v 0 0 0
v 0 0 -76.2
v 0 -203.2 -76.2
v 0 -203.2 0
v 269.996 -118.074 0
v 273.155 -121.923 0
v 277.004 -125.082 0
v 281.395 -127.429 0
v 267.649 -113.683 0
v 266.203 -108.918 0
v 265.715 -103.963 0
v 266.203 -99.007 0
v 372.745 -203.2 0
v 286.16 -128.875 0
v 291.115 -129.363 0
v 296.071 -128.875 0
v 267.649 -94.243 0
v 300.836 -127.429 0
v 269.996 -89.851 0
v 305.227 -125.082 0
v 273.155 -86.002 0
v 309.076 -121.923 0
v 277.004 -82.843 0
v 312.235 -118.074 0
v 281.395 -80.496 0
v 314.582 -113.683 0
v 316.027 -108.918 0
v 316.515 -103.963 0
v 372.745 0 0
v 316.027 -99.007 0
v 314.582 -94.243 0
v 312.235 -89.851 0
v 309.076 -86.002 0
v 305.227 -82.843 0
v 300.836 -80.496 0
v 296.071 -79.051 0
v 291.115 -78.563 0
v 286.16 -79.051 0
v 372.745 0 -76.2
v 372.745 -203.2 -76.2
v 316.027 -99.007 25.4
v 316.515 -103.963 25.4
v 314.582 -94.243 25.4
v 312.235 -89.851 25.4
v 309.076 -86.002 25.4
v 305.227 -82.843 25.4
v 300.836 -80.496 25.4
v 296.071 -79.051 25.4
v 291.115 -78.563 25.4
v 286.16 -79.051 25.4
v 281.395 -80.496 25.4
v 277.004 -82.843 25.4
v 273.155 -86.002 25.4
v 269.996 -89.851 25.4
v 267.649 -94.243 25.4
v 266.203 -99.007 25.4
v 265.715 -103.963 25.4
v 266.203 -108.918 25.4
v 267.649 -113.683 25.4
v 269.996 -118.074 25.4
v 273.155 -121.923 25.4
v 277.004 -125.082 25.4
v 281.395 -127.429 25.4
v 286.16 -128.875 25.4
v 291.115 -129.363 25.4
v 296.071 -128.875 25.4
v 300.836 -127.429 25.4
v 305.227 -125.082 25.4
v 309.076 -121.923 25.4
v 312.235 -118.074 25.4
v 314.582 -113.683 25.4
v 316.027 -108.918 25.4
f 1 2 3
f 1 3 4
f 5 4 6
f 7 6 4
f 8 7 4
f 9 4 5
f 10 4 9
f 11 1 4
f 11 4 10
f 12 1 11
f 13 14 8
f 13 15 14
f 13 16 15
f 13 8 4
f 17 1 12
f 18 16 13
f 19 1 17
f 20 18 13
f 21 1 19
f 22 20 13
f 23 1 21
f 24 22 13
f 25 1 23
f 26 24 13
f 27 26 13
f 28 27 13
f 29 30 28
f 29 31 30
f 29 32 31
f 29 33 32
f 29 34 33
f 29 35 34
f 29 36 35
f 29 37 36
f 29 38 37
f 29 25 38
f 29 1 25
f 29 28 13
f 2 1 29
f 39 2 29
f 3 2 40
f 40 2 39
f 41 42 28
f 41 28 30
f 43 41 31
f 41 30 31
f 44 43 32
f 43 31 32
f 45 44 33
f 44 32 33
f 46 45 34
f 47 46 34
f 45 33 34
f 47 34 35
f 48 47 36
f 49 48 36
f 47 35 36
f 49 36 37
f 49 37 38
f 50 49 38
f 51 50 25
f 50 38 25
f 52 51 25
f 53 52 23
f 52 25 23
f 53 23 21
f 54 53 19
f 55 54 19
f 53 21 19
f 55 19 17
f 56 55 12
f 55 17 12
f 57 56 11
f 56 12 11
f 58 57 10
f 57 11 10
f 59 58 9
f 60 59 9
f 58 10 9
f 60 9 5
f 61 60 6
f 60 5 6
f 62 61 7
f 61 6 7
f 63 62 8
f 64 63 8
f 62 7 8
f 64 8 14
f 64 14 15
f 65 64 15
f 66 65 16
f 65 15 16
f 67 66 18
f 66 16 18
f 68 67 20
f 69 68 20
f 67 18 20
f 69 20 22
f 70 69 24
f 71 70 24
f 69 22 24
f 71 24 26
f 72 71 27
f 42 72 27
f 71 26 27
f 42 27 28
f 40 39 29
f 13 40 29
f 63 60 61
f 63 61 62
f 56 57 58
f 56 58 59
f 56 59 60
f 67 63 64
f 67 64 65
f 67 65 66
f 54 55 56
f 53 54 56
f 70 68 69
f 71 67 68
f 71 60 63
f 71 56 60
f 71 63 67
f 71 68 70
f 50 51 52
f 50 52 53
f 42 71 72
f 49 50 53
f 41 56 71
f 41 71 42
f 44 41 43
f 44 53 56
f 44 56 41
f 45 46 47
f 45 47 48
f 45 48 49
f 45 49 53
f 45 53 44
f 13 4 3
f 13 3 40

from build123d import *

# Parameters (mm, degrees)
F0_W     = 372.745
F0_H     = 76.2
F1_DEPTH = 203.2
F2_R     = 25.4
F3_DEPTH = 25.4


with BuildPart() as f1:
    # F0 (on Front) → F1 (new body)
    with BuildSketch(Plane.XZ):
        with Locations((186.3725, -38.1)):
            Rectangle(F0_W, F0_H)
    extrude(amount=F1_DEPTH)

    # F2 (on face) → F3 (join)
    with BuildSketch(Plane.XY):
        with Locations((291.115373, -103.962786)):
            Circle(F2_R)
    extrude(amount=F3_DEPTH)


solid = f1.part
